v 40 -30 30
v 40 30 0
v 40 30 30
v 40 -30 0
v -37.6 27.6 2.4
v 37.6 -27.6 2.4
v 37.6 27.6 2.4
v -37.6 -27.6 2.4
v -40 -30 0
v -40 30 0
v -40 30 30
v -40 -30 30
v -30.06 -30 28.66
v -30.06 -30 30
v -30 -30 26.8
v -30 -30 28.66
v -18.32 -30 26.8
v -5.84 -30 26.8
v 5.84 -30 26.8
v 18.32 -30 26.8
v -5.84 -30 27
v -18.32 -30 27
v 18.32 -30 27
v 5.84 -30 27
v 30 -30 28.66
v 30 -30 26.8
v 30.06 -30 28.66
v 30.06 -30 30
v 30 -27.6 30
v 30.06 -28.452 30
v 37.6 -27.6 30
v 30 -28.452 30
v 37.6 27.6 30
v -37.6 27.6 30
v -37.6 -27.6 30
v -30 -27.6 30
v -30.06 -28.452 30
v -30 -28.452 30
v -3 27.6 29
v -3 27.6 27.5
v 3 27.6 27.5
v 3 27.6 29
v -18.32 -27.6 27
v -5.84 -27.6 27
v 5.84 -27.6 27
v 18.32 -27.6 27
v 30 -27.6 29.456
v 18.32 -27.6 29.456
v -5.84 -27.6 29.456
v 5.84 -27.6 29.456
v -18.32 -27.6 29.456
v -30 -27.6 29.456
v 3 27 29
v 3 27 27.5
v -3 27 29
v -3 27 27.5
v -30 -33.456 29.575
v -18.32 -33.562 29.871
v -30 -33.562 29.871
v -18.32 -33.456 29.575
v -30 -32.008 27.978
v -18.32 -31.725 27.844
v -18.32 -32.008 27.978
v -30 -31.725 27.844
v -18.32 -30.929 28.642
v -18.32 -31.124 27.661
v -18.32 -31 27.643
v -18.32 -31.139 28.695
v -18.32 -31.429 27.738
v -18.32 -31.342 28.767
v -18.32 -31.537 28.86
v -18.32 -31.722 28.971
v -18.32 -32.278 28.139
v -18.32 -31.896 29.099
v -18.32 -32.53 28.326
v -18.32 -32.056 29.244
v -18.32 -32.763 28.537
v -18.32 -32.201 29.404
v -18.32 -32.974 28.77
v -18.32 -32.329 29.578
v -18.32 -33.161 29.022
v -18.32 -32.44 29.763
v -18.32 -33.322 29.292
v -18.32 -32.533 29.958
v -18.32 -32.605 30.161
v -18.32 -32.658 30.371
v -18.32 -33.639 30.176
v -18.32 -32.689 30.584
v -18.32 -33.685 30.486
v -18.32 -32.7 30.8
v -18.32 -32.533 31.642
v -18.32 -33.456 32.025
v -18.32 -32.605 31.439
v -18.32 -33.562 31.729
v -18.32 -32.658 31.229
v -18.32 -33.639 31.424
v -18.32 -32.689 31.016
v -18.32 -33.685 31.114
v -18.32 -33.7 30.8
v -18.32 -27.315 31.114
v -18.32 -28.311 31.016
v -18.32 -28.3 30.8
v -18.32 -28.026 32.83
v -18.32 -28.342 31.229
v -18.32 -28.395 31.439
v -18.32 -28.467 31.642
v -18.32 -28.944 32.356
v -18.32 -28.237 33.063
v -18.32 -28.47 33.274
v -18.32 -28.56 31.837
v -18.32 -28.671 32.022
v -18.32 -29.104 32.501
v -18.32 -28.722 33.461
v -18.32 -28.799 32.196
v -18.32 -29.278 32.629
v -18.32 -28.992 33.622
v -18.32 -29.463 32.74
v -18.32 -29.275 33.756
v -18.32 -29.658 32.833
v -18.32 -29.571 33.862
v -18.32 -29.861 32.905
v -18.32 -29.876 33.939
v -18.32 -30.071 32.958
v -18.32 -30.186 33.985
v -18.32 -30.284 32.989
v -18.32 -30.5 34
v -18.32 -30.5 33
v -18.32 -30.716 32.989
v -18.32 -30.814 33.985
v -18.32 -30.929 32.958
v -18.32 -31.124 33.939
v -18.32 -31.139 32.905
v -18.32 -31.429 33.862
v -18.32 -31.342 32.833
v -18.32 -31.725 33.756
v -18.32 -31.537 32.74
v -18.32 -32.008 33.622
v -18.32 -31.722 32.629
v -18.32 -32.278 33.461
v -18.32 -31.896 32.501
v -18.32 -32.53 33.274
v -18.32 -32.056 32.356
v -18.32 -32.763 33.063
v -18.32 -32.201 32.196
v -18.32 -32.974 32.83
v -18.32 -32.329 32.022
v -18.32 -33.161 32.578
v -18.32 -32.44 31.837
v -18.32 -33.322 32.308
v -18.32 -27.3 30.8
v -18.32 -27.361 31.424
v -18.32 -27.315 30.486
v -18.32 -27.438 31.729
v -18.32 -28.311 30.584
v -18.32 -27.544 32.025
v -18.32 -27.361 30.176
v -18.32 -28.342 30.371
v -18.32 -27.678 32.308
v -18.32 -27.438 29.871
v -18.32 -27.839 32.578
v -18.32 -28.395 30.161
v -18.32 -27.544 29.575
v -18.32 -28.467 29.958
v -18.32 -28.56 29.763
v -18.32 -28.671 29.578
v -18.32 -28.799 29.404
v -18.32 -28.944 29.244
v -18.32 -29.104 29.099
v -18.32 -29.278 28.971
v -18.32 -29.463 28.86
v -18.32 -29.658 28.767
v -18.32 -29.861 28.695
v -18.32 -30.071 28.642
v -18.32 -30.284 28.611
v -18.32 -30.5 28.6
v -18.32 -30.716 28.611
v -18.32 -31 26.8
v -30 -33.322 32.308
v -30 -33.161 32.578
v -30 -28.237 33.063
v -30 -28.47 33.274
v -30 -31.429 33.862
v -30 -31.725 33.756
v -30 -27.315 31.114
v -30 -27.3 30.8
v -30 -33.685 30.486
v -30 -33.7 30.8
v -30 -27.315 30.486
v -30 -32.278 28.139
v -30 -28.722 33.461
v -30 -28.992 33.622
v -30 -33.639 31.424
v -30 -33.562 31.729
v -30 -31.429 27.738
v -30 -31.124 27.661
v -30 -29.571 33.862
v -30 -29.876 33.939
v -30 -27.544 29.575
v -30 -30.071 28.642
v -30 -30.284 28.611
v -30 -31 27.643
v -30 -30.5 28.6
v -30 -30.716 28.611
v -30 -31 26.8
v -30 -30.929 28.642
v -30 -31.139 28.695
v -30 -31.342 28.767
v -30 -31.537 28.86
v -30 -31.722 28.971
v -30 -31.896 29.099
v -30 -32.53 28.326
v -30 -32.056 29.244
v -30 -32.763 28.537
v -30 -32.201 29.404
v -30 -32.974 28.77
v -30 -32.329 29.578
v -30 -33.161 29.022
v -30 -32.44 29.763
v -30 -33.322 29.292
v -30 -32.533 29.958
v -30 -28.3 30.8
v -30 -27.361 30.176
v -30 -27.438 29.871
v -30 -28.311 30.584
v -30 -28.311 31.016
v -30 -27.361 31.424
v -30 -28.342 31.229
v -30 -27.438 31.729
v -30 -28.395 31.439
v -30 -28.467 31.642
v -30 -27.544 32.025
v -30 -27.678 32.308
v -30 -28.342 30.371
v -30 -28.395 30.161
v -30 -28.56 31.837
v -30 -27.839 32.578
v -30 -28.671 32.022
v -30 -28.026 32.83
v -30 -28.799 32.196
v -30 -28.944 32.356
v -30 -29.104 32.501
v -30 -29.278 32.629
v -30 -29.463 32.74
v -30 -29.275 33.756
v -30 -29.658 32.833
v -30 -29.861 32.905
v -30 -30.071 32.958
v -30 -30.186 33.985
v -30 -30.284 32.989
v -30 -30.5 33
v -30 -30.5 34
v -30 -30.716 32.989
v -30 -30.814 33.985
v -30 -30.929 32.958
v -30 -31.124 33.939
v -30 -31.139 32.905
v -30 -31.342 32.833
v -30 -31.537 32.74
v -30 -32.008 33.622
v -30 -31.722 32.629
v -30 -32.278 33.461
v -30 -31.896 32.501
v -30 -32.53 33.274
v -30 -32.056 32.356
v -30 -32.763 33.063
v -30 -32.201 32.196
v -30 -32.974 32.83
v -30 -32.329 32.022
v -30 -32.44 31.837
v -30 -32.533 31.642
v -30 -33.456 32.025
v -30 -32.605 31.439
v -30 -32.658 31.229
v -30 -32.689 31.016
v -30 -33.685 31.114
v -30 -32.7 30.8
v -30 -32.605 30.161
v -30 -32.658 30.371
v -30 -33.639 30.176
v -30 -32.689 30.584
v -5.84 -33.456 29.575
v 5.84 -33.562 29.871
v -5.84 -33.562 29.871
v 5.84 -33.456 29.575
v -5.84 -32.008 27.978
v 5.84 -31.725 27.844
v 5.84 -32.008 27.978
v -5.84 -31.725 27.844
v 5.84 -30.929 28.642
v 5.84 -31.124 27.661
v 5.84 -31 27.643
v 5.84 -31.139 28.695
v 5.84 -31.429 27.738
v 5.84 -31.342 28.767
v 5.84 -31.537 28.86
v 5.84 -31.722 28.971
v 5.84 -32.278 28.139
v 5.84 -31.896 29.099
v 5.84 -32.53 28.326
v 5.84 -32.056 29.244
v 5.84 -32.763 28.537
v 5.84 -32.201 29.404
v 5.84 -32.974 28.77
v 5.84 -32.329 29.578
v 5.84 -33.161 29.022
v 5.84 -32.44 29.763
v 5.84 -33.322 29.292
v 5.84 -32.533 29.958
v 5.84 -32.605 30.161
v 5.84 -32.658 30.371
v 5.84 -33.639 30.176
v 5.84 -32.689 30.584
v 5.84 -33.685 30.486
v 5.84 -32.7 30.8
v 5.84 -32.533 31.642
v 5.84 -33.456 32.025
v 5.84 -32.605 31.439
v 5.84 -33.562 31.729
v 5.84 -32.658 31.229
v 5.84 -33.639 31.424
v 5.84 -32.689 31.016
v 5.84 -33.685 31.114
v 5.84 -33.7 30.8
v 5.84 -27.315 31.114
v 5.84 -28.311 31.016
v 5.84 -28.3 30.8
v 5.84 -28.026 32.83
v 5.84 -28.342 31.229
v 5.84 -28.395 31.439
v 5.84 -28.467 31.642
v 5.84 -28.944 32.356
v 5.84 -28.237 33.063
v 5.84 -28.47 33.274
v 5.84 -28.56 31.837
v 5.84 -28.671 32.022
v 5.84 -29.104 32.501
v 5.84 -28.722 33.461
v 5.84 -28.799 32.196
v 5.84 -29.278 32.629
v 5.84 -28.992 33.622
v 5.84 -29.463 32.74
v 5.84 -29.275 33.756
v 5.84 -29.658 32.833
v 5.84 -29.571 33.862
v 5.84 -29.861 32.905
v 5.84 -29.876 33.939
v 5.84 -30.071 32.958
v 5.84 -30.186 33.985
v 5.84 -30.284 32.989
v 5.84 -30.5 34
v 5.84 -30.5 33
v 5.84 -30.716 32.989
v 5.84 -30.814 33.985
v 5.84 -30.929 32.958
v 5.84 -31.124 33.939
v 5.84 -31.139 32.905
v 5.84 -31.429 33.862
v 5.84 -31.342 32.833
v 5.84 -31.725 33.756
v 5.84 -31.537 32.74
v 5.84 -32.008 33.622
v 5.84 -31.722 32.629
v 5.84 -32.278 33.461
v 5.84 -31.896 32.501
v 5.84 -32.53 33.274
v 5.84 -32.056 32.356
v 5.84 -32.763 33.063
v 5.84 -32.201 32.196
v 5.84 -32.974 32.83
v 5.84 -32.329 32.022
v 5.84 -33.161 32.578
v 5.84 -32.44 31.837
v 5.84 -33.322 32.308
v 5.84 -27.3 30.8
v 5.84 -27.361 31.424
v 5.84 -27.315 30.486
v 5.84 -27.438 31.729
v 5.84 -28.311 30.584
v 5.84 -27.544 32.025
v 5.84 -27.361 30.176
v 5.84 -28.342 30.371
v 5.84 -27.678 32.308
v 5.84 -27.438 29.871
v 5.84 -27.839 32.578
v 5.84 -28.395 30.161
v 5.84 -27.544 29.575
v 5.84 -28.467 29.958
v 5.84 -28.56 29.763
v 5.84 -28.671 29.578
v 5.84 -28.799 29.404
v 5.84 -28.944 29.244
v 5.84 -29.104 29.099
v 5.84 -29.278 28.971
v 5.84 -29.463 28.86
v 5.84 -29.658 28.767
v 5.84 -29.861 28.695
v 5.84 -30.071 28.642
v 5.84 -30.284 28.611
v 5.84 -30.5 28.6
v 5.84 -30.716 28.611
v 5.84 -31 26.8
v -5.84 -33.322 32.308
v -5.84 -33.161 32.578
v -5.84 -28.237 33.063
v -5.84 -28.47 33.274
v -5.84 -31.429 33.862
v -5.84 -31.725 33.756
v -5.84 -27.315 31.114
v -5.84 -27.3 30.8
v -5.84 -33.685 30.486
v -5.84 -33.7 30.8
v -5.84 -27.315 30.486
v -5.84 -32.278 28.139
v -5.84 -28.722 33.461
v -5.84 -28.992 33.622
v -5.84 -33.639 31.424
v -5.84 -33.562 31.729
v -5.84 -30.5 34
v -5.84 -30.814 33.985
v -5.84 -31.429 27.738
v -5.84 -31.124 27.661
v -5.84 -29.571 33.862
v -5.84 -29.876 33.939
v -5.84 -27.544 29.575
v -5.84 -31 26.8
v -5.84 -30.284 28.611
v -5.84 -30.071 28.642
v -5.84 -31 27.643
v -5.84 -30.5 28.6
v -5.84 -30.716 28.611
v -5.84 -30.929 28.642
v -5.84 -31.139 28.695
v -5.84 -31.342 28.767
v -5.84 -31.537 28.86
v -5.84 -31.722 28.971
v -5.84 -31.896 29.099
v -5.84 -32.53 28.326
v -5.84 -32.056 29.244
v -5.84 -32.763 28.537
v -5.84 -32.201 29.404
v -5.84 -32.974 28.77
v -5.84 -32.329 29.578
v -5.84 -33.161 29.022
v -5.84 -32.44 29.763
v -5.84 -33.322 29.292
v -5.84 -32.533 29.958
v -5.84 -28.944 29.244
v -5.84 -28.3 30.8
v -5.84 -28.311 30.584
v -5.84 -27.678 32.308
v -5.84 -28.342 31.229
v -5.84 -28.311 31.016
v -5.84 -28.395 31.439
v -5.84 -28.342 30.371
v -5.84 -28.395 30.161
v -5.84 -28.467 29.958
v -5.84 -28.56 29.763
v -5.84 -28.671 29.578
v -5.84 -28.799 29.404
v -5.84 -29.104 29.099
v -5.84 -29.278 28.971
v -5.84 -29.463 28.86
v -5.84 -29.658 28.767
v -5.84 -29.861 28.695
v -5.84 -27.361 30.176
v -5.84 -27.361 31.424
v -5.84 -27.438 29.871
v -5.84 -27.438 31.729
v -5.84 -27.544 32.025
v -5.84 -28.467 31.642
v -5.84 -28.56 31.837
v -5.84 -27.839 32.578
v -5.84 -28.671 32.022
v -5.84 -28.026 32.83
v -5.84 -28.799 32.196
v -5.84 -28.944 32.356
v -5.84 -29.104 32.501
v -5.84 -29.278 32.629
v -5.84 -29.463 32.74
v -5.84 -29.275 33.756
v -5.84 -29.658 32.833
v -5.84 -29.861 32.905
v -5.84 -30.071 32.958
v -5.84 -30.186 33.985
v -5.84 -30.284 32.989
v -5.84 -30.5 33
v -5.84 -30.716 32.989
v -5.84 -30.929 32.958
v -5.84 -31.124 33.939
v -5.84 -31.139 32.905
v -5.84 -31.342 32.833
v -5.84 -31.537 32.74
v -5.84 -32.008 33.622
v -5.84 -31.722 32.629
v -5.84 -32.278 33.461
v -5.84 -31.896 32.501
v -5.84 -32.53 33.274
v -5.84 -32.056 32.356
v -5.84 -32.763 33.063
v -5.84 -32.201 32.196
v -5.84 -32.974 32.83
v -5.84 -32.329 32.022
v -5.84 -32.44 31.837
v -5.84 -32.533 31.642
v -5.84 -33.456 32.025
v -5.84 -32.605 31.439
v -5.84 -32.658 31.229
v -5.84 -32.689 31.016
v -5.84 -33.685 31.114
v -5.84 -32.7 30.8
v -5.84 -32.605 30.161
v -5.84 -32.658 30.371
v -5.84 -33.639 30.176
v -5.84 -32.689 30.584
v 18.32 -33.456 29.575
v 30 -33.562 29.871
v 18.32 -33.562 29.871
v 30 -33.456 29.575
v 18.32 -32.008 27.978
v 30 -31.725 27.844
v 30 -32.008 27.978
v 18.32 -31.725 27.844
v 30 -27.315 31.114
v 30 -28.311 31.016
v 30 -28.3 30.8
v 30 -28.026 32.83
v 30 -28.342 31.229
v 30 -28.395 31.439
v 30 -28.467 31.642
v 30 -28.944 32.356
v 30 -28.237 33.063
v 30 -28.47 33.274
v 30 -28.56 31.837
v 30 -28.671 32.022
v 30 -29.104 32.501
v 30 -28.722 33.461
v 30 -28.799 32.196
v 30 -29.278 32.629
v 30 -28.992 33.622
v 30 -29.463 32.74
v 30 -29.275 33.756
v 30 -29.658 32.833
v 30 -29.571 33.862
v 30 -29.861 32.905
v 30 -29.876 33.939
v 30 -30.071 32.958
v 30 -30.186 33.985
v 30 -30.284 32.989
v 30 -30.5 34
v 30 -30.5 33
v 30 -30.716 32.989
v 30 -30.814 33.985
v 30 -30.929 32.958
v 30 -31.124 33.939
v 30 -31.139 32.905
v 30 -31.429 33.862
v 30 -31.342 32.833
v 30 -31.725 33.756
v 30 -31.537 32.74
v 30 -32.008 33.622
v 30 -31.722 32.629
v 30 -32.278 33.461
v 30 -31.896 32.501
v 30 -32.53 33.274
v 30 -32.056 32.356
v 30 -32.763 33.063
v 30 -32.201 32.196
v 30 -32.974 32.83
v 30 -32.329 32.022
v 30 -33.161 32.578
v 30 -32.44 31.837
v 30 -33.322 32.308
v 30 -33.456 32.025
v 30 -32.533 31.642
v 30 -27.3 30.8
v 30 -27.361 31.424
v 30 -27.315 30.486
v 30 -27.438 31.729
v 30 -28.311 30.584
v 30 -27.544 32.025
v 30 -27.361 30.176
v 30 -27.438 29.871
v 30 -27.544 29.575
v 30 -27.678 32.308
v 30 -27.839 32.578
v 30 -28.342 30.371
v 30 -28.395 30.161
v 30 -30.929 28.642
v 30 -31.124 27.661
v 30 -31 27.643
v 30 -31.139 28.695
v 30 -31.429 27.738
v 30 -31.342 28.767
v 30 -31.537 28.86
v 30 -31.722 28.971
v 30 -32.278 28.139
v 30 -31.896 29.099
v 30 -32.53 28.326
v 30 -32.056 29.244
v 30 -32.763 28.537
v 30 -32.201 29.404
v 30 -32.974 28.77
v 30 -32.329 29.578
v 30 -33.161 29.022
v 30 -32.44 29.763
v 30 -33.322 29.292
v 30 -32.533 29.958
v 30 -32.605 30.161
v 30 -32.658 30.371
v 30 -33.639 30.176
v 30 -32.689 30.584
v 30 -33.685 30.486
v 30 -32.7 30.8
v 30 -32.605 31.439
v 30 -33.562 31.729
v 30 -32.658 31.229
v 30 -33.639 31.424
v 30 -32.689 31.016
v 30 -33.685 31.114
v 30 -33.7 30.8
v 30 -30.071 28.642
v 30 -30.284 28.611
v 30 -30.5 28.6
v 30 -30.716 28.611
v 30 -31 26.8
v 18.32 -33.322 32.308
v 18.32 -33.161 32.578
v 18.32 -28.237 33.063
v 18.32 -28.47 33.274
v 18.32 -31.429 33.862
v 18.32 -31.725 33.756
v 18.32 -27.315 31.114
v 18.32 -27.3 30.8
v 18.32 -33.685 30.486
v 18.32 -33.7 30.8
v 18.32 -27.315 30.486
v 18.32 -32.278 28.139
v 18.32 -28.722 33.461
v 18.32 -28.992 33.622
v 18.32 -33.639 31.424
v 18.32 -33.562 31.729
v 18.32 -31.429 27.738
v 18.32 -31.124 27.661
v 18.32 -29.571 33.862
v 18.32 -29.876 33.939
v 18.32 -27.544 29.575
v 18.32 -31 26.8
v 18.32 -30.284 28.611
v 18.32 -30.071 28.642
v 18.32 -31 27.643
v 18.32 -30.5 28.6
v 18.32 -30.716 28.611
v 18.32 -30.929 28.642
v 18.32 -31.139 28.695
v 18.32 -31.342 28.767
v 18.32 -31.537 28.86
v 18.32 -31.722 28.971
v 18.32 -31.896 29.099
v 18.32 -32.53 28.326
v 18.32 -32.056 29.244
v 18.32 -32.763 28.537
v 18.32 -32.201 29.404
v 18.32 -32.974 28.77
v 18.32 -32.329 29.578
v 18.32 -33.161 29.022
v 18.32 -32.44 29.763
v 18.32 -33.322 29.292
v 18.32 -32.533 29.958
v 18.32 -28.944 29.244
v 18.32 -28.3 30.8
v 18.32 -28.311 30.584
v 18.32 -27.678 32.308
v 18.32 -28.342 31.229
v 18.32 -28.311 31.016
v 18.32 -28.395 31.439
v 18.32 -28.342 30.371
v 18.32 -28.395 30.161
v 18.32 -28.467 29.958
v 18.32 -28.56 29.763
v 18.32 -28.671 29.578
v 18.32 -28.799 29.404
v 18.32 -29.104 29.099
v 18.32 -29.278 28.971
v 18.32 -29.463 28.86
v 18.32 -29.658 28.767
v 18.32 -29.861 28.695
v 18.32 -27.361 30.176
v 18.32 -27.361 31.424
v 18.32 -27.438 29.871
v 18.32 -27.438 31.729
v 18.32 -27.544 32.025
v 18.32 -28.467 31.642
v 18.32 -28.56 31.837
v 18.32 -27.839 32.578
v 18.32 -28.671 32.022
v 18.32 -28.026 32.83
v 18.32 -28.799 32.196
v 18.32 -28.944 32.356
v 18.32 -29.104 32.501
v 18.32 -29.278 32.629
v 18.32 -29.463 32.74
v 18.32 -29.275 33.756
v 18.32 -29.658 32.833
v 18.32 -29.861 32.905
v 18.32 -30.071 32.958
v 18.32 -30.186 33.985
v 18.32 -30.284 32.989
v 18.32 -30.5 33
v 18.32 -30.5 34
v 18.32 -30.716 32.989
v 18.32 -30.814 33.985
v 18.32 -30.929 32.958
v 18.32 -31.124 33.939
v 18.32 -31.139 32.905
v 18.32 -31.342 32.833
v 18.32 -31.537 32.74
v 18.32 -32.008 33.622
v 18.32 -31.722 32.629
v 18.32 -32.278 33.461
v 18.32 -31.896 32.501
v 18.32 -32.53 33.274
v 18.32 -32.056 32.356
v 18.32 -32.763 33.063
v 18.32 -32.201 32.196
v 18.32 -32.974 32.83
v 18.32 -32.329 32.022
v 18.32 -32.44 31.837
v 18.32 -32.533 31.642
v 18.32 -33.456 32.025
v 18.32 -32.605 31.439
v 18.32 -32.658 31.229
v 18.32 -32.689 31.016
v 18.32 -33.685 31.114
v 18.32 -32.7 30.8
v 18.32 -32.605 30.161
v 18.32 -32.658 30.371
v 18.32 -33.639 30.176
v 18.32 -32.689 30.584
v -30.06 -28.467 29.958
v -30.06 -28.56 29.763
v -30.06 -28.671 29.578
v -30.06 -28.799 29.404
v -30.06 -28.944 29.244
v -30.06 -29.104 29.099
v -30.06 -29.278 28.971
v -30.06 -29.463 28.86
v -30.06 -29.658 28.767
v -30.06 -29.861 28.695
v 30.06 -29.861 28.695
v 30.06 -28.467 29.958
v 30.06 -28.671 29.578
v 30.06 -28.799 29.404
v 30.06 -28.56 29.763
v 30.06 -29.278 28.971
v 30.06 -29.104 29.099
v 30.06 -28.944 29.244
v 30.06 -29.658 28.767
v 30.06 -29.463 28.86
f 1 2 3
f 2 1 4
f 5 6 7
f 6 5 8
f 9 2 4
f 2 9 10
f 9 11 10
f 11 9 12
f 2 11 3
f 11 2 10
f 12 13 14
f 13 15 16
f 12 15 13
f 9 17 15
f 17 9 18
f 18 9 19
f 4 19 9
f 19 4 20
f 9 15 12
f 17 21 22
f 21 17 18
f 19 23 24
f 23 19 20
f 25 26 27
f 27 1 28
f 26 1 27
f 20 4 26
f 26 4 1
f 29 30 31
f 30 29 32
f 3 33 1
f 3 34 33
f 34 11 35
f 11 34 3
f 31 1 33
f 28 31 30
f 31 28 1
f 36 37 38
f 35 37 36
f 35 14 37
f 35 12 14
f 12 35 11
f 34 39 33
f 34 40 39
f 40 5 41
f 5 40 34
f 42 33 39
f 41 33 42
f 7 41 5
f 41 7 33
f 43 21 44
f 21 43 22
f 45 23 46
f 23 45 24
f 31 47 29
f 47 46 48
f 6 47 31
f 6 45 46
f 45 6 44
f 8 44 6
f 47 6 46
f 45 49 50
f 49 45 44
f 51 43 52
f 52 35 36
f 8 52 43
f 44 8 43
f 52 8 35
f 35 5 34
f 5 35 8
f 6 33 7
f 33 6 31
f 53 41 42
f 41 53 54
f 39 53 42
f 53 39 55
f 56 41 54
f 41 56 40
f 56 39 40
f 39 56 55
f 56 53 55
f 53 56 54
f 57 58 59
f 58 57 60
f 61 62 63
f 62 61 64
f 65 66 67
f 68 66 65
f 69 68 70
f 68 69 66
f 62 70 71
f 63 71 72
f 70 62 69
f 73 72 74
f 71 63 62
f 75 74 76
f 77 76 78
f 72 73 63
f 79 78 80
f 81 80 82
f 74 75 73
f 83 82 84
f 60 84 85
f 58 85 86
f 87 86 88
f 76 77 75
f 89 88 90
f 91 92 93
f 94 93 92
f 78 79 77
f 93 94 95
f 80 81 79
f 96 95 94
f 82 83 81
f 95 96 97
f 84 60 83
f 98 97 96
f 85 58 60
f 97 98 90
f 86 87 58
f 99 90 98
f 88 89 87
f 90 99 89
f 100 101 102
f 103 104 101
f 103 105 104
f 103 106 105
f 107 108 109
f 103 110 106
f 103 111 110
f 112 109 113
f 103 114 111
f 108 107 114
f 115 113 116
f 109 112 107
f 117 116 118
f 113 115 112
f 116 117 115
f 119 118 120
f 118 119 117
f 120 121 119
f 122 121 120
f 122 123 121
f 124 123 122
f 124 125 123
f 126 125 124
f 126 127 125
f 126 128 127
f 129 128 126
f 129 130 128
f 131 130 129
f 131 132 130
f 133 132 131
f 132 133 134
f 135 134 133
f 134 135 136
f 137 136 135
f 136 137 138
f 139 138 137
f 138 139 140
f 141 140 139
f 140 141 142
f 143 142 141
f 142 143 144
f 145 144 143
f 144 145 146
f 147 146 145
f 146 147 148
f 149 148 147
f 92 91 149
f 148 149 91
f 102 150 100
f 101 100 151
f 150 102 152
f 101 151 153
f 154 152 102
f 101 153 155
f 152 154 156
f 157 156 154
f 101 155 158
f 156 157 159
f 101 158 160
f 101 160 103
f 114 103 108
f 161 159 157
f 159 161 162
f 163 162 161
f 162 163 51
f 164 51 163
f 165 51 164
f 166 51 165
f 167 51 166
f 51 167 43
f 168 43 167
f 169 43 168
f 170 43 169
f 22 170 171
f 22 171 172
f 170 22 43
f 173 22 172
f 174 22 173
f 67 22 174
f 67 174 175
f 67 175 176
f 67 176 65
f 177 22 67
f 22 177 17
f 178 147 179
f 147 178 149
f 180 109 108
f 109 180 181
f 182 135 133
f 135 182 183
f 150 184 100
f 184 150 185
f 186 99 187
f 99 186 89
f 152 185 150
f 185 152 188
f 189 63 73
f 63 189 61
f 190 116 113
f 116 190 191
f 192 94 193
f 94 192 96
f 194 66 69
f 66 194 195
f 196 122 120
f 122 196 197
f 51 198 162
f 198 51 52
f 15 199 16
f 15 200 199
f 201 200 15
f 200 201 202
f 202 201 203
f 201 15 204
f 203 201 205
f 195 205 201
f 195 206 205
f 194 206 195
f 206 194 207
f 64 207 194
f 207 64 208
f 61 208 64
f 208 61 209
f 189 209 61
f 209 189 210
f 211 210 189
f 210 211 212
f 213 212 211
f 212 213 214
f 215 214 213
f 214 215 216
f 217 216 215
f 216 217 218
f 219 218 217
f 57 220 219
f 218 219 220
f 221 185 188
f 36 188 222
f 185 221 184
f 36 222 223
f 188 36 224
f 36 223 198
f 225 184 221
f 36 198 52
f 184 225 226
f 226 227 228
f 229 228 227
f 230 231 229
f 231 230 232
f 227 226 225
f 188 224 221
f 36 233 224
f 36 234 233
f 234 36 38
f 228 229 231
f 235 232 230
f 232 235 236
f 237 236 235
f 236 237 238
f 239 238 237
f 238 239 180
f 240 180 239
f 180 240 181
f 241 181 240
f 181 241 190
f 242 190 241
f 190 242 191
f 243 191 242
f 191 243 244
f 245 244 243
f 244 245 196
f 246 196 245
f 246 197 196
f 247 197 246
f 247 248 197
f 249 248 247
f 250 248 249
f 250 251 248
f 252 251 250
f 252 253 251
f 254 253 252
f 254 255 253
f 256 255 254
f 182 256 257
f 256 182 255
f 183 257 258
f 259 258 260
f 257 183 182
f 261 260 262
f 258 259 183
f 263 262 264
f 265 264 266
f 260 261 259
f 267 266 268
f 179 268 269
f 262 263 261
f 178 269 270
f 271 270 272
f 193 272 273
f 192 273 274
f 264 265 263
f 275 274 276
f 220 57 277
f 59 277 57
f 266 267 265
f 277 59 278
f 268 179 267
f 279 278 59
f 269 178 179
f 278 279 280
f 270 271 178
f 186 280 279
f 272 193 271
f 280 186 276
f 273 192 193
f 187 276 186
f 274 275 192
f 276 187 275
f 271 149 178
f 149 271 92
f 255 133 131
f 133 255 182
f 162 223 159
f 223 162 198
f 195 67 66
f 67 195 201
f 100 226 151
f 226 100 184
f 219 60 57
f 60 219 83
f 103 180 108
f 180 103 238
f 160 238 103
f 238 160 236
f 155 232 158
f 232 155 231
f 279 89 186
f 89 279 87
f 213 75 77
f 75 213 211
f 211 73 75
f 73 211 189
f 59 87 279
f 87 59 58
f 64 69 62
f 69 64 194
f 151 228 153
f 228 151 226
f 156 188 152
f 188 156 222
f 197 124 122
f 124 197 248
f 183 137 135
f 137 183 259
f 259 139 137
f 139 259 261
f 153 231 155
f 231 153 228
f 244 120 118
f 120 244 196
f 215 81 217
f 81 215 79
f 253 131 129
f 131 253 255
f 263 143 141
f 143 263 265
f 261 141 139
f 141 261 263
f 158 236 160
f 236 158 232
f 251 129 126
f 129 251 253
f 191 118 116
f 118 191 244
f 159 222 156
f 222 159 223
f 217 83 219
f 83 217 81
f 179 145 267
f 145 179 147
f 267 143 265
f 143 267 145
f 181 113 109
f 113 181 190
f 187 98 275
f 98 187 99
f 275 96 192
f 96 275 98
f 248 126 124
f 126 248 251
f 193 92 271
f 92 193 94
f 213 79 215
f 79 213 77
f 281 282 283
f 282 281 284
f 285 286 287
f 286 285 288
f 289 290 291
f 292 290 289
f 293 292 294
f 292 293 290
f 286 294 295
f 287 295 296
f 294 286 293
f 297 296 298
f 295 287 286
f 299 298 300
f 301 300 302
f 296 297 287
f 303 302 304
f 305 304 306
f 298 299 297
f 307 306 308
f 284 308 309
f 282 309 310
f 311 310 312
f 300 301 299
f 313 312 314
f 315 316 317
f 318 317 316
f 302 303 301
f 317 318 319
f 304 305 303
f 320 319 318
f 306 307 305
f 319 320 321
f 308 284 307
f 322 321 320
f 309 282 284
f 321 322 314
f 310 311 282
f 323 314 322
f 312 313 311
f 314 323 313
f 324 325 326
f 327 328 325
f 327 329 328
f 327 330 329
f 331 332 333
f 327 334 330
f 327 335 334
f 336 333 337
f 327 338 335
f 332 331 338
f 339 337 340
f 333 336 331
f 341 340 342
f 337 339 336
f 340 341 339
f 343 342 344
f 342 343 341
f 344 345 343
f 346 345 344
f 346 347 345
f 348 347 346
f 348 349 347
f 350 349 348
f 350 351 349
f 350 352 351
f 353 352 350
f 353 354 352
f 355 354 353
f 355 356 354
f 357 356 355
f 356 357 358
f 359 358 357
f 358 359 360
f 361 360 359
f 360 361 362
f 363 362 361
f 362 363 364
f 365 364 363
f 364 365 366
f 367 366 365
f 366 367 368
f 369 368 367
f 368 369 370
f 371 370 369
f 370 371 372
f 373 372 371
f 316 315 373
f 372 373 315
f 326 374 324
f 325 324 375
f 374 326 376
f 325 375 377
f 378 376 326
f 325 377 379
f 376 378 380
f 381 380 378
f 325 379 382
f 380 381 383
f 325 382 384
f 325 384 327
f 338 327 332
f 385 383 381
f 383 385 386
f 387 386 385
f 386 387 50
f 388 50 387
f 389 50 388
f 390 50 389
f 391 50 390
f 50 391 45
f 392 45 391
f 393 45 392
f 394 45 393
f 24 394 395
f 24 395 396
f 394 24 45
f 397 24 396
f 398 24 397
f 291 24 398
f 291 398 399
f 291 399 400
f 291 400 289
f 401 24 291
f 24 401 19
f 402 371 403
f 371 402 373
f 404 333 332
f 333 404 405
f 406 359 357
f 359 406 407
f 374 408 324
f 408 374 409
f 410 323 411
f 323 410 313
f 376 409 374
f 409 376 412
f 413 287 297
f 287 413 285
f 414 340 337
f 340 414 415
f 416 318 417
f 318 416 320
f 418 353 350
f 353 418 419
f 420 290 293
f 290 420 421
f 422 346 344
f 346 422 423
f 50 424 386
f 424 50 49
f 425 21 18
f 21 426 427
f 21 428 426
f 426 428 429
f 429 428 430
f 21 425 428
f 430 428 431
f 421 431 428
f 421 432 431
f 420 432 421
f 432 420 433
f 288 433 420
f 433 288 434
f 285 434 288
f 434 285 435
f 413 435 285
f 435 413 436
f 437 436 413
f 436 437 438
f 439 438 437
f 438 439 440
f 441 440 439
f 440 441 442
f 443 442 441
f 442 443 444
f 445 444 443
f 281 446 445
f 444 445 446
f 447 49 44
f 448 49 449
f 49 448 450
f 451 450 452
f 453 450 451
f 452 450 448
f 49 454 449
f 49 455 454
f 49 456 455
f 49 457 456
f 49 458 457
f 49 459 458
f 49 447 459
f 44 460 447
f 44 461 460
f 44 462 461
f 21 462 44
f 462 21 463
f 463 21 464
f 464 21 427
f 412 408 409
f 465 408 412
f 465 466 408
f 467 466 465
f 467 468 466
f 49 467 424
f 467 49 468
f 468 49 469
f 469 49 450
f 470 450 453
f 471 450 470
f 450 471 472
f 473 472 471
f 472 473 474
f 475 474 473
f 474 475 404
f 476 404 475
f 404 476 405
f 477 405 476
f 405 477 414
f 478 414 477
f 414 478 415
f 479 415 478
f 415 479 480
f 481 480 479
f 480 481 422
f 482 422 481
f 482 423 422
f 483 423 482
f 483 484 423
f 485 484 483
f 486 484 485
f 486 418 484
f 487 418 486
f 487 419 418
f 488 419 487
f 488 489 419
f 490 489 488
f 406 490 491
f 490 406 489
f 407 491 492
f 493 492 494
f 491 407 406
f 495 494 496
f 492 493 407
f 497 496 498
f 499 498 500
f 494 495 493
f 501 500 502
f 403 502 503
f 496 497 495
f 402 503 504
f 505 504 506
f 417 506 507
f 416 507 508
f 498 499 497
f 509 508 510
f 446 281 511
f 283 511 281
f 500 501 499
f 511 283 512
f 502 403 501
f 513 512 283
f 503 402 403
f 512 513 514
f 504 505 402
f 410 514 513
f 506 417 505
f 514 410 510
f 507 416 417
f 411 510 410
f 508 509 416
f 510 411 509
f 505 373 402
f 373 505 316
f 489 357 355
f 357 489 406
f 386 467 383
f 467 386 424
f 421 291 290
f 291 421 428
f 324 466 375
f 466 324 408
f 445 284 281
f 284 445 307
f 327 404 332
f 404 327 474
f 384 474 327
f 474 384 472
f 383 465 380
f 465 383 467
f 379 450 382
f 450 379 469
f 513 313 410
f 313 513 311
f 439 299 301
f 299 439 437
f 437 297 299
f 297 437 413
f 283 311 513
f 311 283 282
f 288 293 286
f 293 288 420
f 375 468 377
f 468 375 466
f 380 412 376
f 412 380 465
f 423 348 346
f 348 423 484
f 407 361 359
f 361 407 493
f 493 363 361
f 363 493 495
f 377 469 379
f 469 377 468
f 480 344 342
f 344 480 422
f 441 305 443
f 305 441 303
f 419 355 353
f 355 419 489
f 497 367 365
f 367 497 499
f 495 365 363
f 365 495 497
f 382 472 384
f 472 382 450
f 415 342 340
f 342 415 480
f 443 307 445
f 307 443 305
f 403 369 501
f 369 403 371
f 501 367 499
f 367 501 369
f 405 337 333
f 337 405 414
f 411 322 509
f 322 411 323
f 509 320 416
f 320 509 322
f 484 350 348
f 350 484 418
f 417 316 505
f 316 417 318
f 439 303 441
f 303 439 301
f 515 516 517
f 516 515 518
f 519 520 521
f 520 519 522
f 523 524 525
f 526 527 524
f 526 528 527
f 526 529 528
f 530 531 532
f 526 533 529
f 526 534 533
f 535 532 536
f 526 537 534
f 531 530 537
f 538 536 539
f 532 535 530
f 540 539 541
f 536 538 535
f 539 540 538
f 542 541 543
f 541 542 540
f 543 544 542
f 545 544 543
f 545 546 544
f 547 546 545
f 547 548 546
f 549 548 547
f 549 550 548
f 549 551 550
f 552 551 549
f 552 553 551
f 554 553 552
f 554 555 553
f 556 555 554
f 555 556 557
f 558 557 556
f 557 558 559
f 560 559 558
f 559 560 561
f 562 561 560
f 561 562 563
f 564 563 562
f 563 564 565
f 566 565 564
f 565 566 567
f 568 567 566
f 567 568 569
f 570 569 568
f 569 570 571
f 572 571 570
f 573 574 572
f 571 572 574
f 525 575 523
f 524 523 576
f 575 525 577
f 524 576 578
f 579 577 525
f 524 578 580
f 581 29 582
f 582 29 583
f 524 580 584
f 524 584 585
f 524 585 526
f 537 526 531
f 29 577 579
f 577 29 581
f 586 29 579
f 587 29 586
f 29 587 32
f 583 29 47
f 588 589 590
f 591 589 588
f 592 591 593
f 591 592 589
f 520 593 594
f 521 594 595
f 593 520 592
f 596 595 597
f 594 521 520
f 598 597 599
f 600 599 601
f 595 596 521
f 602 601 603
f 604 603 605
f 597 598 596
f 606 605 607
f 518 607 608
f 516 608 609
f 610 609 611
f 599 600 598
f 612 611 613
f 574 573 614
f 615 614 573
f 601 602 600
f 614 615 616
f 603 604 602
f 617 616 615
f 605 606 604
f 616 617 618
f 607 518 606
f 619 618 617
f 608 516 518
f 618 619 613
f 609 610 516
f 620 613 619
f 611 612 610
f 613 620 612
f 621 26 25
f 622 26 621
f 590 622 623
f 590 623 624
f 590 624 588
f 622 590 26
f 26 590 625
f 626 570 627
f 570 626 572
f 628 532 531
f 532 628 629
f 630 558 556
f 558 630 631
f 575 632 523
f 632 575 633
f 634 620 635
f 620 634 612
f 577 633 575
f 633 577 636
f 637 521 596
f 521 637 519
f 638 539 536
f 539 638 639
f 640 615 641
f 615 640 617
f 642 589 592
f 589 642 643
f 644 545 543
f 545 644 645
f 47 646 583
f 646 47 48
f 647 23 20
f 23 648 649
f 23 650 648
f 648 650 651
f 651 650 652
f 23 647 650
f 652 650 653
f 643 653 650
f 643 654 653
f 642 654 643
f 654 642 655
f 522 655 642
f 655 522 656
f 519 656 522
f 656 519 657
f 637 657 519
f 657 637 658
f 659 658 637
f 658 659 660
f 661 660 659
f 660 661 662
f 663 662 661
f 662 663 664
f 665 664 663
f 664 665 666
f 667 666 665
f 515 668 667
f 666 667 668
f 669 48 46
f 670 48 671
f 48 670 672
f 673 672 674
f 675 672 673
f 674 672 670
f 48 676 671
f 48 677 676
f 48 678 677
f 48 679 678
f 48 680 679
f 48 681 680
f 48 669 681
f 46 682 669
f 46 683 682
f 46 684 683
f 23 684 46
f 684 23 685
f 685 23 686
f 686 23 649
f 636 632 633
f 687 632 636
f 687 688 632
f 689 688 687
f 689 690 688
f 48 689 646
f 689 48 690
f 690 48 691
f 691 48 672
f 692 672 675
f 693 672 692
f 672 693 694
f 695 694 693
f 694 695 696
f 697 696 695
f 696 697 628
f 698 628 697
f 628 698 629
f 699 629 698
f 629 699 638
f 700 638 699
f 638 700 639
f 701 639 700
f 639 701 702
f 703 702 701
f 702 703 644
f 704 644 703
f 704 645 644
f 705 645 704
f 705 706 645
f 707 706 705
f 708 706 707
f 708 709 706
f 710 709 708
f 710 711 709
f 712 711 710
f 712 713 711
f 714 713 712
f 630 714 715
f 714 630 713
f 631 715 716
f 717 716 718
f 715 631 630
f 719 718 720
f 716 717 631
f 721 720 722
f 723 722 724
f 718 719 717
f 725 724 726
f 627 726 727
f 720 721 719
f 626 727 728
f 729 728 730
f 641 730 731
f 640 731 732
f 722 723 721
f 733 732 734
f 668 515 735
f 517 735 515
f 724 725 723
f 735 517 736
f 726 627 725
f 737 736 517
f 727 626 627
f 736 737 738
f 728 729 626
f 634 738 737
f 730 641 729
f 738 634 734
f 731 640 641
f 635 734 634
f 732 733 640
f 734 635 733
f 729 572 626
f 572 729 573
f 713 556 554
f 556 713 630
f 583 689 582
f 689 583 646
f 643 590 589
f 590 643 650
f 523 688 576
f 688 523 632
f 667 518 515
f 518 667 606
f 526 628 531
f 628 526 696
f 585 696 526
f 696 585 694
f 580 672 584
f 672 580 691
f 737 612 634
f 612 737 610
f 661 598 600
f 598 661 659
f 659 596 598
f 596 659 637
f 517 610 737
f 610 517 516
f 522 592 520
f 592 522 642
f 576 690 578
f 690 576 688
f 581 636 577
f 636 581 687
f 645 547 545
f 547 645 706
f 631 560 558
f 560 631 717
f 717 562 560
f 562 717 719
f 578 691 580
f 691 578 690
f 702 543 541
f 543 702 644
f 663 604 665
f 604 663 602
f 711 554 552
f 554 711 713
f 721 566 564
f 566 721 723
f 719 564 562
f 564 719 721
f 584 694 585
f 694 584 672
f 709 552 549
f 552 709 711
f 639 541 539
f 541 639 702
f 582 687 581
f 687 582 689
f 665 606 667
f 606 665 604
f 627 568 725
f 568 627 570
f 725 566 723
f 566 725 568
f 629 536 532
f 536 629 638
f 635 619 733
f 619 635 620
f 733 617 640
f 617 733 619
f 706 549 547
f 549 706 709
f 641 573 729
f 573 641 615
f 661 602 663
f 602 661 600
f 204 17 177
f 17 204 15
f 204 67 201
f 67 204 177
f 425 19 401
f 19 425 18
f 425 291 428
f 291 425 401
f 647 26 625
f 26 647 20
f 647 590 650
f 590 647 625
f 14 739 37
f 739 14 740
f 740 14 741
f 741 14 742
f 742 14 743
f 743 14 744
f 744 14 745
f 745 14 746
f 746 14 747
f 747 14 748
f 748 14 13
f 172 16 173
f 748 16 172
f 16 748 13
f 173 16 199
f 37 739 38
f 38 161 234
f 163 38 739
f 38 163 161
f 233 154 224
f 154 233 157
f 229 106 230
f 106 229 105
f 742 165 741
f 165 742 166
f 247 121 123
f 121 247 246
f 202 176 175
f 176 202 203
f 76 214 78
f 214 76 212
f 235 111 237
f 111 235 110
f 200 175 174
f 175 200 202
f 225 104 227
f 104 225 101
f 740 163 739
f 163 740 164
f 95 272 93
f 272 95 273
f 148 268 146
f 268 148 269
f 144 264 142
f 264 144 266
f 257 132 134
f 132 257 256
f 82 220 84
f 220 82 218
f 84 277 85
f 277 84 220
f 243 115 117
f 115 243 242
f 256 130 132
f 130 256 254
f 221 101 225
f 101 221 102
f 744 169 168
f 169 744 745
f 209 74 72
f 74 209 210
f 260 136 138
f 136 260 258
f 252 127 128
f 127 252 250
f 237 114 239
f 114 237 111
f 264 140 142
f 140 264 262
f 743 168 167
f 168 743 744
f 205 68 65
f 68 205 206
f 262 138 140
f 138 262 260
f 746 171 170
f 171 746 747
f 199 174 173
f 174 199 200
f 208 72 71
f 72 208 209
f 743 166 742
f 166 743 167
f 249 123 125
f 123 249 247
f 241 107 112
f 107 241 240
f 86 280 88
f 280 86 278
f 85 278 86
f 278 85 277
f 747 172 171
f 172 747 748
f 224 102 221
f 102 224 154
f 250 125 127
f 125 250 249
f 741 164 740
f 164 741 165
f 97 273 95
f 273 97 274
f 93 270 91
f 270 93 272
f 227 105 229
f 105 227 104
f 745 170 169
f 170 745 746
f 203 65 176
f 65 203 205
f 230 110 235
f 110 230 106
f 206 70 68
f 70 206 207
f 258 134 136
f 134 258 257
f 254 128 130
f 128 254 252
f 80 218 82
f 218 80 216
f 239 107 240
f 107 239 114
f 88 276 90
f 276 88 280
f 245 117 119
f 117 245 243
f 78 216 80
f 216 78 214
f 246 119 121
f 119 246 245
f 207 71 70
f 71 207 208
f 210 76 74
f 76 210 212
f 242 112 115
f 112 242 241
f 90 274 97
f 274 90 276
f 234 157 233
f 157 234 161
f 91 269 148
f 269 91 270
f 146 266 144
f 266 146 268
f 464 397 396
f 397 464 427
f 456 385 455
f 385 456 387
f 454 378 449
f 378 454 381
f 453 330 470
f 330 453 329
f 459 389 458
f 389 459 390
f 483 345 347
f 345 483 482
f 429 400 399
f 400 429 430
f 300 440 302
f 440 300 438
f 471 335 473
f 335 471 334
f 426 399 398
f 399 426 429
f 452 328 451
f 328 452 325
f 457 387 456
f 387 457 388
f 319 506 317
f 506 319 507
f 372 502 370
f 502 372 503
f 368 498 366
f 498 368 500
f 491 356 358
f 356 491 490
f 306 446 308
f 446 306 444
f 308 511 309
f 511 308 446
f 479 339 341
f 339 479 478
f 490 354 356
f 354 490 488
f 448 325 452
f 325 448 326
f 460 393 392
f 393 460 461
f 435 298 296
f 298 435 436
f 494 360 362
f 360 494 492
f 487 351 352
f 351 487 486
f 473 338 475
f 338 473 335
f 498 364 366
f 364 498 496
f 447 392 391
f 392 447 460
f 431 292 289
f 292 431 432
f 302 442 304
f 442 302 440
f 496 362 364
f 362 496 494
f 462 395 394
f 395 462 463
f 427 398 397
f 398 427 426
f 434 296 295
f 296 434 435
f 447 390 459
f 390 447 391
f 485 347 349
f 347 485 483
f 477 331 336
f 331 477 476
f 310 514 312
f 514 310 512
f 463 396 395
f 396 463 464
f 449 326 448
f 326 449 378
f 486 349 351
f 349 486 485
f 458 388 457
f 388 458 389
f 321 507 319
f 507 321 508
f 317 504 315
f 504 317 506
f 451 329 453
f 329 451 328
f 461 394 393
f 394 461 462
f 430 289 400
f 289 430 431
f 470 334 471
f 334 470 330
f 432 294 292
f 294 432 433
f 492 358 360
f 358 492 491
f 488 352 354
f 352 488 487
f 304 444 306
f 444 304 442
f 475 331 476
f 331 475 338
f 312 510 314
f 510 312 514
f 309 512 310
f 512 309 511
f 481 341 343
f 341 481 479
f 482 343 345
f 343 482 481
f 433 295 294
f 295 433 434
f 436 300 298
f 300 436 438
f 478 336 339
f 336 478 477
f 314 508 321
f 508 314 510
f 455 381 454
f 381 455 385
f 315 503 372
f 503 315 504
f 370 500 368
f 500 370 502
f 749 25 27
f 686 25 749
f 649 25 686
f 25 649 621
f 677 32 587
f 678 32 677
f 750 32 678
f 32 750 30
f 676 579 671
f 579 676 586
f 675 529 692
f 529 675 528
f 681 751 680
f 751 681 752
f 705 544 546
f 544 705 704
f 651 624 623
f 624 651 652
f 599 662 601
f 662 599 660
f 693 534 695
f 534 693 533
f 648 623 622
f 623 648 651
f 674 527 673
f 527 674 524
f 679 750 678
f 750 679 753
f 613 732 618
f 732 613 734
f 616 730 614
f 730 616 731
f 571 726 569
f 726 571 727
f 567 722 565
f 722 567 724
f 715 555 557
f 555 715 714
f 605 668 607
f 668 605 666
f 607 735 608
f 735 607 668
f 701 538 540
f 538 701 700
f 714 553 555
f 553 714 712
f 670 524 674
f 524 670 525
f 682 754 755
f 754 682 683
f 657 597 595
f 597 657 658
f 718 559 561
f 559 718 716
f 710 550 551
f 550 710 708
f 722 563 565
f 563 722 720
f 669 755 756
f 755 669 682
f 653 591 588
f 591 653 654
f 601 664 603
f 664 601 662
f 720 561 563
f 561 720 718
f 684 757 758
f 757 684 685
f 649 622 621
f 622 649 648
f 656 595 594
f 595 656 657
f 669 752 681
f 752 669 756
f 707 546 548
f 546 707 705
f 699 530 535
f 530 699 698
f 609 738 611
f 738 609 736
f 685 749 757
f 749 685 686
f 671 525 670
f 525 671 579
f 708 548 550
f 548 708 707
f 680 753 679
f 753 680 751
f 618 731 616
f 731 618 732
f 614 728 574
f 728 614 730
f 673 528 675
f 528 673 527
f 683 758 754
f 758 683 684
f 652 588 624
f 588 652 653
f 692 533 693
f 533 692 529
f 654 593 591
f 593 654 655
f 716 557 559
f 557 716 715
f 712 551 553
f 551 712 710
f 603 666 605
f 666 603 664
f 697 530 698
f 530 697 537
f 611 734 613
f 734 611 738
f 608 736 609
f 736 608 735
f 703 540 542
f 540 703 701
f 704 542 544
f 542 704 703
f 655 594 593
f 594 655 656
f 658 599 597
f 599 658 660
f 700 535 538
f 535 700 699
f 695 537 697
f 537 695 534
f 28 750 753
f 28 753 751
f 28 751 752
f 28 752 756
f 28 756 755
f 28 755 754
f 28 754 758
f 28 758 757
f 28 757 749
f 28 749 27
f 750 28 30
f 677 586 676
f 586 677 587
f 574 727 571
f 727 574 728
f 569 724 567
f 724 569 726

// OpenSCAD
// Box with print-in-place hinge (v4: bridge webs to kill band overhangs)
part = "box"; // [box, lid, pin, assembly]
cadverify_only = "";
module instance(name, part, unit = 1) {
    echo(cadverify_instance = [name, part, unit]);
    if (cadverify_only == "" || cadverify_only == name) children();
}

Rkn = 3.2; rbore = 2.2; rpin = 1.9;
yh = -30.5; zh = 30.8;
lid_zh = 3.4;
lid_lift = 27.4;
pin_lift_z = 27.8; pin_shift_y = -30.5;
k0x0=-30; k0x1=-18.32;
k1x0=-17.92; k1x1=-6.24;
k2x0=-5.84; k2x1=5.84;
k3x0=6.24; k3x1=17.92;
k4x0=18.32; k4x1=30;

$fn = 64;

module xcyl(x0, x1, r, y, z) {
    translate([x0, y, z]) rotate([0, 90, 0]) cylinder(r = r, h = x1 - x0);
}

module box_part() {
    difference() {
        union() {
            translate([-40, -30, 0]) cube([80, 60, 2.4]);
            translate([-40, 27.6, 2.4]) cube([80, 2.4, 27.6]);
            translate([-40, -30, 2.4]) cube([80, 2.4, 24.6]);
            translate([-40, -30, 27.0]) cube([11, 2.4, 3.0]);
            translate([29, -30, 27.0]) cube([11, 2.4, 3.0]);
            translate([-40, -27.6, 2.4]) cube([2.4, 55.2, 27.6]);
            translate([37.6, -27.6, 2.4]) cube([2.4, 55.2, 27.6]);
            translate([-3, 27.0, 27.5]) cube([6, 0.6, 1.5]);
            // hinge knuckles + support webs tying them to the back wall
            xcyl(k0x0, k0x1, Rkn, yh, zh);
            xcyl(k2x0, k2x1, Rkn, yh, zh);
            xcyl(k4x0, k4x1, Rkn, yh, zh);
            translate([k0x0, -31, 26.8]) cube([k0x1-k0x0, 3.4, 4.0]);
            translate([k2x0, -31, 26.8]) cube([k2x1-k2x0, 3.4, 4.0]);
            translate([k4x0, -31, 26.8]) cube([k4x1-k4x0, 3.4, 4.0]);
        }
        xcyl(k0x0-0.06, k0x1+0.06, rbore, yh, zh);
        xcyl(k2x0-0.06, k2x1+0.06, rbore, yh, zh);
        xcyl(k4x0-0.06, k4x1+0.06, rbore, yh, zh);
    }
}

module lid_part() {
    difference() {
        union() {
            translate([-40, -30, 10.6]) cube([80, 60, 2.4]);
            translate([-40, 27.6, 3]) cube([80, 2.4, 7.6]);
            translate([k1x0, -30, 3]) cube([k1x1-k1x0, 2.4, 7.6]);
            translate([k3x0, -30, 3]) cube([k3x1-k3x0, 2.4, 7.6]);
            translate([-40, -30, 3]) cube([11, 2.4, 7.6]);
            translate([29, -30, 3]) cube([11, 2.4, 7.6]);
            translate([-40, -27.6, 3]) cube([2.4, 55.2, 7.6]);
            translate([37.6, -27.6, 3]) cube([2.4, 55.2, 7.6]);
            translate([-37.2, 25.2, 0]) cube([74.4, 2.0, 10.6]);
            translate([-37.2, -27.2, 0]) cube([74.4, 2.0, 10.6]);
            translate([-37.2, -25.2, 0]) cube([2.0, 50.4, 10.6]);
            translate([35.2, -25.2, 0]) cube([2.0, 50.4, 10.6]);
            xcyl(k1x0, k1x1, Rkn, yh, lid_zh);
            xcyl(k3x0, k3x1, Rkn, yh, lid_zh);
            translate([k1x0, -31, 0]) cube([k1x1-k1x0, 3.4, 5]);
            translate([k3x0, -31, 0]) cube([k3x1-k3x0, 3.4, 5]);
        }
        xcyl(k1x0-0.06, k1x1+0.06, rbore, yh, lid_zh);
        xcyl(k3x0-0.06, k3x1+0.06, rbore, yh, lid_zh);
        translate([-3.3, 26.3, -0.05]) cube([6.6, 1.5, 2.05]);
    }
}

module pin_part() {
    union() {
        xcyl(-32.4, 32.4, rpin, 0, 3);
        xcyl(30.4, 32.4, 3, 0, 3);
        xcyl(-32.4, -30.4, 3, 0, 3);
    }
}

if (part == "box") {
    echo(cadverify_spec = [
        ["bounds", [[-40, -33.7, 0], [40, 30, 34.0]]],
        ["bodies", 1],
        ["through_holes", 3],
        ["support_faces", [["bed", "-z", 4000]]],
        ["overhangs_allowed", [["hinge knuckles, bores and wall cutouts print in place", [[-30.2, -33.9, 26.5], [30.2, -27.1, 33.5]]], ["catch bump underside, tiny 3.6 mm2 ledge", [[-3.2, 26.8, 27.3], [3.2, 27.8, 27.7]]]]],
        ["copies", 1],
        ["details", [
            ["floor", "thickness", [0, 0, -1], [0, 0, 1], 2.4],
            ["front_wall", "thickness", [0, 31, 15], [0, -1, 0], 2.4],
            ["cavity", "void", [[-37.6, -27.6, 2.4], [37.6, 27.6, 29.9]], 0.9],
            ["hinge_bore", "hole", [-31, -30.5, 30.8], [1, 0, 0], [[0, 4.4], [11.6, 4.4]]],
            ["catch_bump", "material", [[-3, 27.0, 27.5], [3, 27.6, 29.0]], 0.9],
            ["hinge_view", "view", [[-30, -34, 26.5], [30, -27, 34.5]]]
        ]]
    ]);
    box_part();
} else if (part == "lid") {
    echo(cadverify_spec = [
        ["bounds", [[-40, -33.7, 0], [40, 30, 13]]],
        ["bodies", 1],
        ["through_holes", 2],
        ["support_faces", [["bed", "-z", 300]]],
        ["overhangs_allowed", [
            ["hinge knuckles and bores print in place", [[-18.2, -33.9, 0], [18.2, -27.1, 4.2]]],
            ["lid top bridging over plug cavity", [[-37.2, -24.9, 10.1], [37.2, 25.2, 11.1]]]
        ]],
        ["copies", 1],
        ["details", [
            ["top", "thickness", [0, 0, 14], [0, 0, -1], 2.4],
            ["skirt", "thickness", [0, 31, 6], [0, -1, 0], 2.4],
            ["plug_cavity", "void", [[-35.2, -24.9, 0], [35.2, 25.2, 10.5]], 0.9],
            ["hinge_bore", "hole", [-18.6, -30.5, 3.4], [1, 0, 0], [[0, 4.4], [11.6, 4.4]]],
            ["catch_notch", "void", [[-3.3, 26.3, 0], [3.3, 27.8, 2.0]], 0.9],
            ["catch_view", "view", [[-5, 26, 0], [5, 28.5, 3]]]
        ]]
    ]);
    lid_part();
} else if (part == "pin") {
    echo(cadverify_spec = [
        ["bounds", [[-32.4, -3, 0], [32.4, 3, 6]]],
        ["bodies", 1],
        ["support_faces", []],
        ["overhangs_allowed", [["pin shaft underside bridges with 0.3 gap", [[-32.4, -1.9, 0], [32.4, 1.9, 1.6]]]]],
        ["copies", 1],
        ["details", [
            ["shaft", "thickness", [0, 3, 3], [0, -1, 0], 3.8],
            ["head", "material", [[30.4, -3, 0], [32.4, 3, 6]], 0.7],
            ["pin_view", "view", [[-32.4, -3, 0], [32.4, 3, 6]]]
        ]]
    ]);
    pin_part();
} else if (part == "assembly") {
    echo(cadverify_spec = [
        ["bounds", [[-40, -33.7, 0], [40, 30, 40.4]]],
        ["support_faces", [["bed", "-z", 4000]]],
        ["allowed_interferences", []],
        ["motions", [
            ["lid_open", ["lid"], "rotate", [0, -30.5, 30.8], [1, 0, 0], [0, 110], ["flex", [["lid", "box", 0.5, "catch bump clearance pass"]]]]
        ]],
        ["assembly_order", [
            [["box"], [0, 0, 0]],
            [["lid"], [0, 0, -1]],
            [["pin"], [1, 0, 0]]
        ]],
        ["print_in_place", 0.3],
        ["overhangs_allowed", [
            ["hinge undersides, pin bridge and cutouts in place", [[-33, -34, 26.5], [33, -27, 34.8]]],
            ["lid top bridging over box cavity", [[-37.2, -24.9, 37.5], [37.2, 25.2, 38.5]]]
        ]]
    ]);
    instance("box", "box") box_part();
    instance("lid", "lid") translate([0, 0, lid_lift]) lid_part();
    instance("pin", "pin") translate([0, pin_shift_y, pin_lift_z]) pin_part();
}
